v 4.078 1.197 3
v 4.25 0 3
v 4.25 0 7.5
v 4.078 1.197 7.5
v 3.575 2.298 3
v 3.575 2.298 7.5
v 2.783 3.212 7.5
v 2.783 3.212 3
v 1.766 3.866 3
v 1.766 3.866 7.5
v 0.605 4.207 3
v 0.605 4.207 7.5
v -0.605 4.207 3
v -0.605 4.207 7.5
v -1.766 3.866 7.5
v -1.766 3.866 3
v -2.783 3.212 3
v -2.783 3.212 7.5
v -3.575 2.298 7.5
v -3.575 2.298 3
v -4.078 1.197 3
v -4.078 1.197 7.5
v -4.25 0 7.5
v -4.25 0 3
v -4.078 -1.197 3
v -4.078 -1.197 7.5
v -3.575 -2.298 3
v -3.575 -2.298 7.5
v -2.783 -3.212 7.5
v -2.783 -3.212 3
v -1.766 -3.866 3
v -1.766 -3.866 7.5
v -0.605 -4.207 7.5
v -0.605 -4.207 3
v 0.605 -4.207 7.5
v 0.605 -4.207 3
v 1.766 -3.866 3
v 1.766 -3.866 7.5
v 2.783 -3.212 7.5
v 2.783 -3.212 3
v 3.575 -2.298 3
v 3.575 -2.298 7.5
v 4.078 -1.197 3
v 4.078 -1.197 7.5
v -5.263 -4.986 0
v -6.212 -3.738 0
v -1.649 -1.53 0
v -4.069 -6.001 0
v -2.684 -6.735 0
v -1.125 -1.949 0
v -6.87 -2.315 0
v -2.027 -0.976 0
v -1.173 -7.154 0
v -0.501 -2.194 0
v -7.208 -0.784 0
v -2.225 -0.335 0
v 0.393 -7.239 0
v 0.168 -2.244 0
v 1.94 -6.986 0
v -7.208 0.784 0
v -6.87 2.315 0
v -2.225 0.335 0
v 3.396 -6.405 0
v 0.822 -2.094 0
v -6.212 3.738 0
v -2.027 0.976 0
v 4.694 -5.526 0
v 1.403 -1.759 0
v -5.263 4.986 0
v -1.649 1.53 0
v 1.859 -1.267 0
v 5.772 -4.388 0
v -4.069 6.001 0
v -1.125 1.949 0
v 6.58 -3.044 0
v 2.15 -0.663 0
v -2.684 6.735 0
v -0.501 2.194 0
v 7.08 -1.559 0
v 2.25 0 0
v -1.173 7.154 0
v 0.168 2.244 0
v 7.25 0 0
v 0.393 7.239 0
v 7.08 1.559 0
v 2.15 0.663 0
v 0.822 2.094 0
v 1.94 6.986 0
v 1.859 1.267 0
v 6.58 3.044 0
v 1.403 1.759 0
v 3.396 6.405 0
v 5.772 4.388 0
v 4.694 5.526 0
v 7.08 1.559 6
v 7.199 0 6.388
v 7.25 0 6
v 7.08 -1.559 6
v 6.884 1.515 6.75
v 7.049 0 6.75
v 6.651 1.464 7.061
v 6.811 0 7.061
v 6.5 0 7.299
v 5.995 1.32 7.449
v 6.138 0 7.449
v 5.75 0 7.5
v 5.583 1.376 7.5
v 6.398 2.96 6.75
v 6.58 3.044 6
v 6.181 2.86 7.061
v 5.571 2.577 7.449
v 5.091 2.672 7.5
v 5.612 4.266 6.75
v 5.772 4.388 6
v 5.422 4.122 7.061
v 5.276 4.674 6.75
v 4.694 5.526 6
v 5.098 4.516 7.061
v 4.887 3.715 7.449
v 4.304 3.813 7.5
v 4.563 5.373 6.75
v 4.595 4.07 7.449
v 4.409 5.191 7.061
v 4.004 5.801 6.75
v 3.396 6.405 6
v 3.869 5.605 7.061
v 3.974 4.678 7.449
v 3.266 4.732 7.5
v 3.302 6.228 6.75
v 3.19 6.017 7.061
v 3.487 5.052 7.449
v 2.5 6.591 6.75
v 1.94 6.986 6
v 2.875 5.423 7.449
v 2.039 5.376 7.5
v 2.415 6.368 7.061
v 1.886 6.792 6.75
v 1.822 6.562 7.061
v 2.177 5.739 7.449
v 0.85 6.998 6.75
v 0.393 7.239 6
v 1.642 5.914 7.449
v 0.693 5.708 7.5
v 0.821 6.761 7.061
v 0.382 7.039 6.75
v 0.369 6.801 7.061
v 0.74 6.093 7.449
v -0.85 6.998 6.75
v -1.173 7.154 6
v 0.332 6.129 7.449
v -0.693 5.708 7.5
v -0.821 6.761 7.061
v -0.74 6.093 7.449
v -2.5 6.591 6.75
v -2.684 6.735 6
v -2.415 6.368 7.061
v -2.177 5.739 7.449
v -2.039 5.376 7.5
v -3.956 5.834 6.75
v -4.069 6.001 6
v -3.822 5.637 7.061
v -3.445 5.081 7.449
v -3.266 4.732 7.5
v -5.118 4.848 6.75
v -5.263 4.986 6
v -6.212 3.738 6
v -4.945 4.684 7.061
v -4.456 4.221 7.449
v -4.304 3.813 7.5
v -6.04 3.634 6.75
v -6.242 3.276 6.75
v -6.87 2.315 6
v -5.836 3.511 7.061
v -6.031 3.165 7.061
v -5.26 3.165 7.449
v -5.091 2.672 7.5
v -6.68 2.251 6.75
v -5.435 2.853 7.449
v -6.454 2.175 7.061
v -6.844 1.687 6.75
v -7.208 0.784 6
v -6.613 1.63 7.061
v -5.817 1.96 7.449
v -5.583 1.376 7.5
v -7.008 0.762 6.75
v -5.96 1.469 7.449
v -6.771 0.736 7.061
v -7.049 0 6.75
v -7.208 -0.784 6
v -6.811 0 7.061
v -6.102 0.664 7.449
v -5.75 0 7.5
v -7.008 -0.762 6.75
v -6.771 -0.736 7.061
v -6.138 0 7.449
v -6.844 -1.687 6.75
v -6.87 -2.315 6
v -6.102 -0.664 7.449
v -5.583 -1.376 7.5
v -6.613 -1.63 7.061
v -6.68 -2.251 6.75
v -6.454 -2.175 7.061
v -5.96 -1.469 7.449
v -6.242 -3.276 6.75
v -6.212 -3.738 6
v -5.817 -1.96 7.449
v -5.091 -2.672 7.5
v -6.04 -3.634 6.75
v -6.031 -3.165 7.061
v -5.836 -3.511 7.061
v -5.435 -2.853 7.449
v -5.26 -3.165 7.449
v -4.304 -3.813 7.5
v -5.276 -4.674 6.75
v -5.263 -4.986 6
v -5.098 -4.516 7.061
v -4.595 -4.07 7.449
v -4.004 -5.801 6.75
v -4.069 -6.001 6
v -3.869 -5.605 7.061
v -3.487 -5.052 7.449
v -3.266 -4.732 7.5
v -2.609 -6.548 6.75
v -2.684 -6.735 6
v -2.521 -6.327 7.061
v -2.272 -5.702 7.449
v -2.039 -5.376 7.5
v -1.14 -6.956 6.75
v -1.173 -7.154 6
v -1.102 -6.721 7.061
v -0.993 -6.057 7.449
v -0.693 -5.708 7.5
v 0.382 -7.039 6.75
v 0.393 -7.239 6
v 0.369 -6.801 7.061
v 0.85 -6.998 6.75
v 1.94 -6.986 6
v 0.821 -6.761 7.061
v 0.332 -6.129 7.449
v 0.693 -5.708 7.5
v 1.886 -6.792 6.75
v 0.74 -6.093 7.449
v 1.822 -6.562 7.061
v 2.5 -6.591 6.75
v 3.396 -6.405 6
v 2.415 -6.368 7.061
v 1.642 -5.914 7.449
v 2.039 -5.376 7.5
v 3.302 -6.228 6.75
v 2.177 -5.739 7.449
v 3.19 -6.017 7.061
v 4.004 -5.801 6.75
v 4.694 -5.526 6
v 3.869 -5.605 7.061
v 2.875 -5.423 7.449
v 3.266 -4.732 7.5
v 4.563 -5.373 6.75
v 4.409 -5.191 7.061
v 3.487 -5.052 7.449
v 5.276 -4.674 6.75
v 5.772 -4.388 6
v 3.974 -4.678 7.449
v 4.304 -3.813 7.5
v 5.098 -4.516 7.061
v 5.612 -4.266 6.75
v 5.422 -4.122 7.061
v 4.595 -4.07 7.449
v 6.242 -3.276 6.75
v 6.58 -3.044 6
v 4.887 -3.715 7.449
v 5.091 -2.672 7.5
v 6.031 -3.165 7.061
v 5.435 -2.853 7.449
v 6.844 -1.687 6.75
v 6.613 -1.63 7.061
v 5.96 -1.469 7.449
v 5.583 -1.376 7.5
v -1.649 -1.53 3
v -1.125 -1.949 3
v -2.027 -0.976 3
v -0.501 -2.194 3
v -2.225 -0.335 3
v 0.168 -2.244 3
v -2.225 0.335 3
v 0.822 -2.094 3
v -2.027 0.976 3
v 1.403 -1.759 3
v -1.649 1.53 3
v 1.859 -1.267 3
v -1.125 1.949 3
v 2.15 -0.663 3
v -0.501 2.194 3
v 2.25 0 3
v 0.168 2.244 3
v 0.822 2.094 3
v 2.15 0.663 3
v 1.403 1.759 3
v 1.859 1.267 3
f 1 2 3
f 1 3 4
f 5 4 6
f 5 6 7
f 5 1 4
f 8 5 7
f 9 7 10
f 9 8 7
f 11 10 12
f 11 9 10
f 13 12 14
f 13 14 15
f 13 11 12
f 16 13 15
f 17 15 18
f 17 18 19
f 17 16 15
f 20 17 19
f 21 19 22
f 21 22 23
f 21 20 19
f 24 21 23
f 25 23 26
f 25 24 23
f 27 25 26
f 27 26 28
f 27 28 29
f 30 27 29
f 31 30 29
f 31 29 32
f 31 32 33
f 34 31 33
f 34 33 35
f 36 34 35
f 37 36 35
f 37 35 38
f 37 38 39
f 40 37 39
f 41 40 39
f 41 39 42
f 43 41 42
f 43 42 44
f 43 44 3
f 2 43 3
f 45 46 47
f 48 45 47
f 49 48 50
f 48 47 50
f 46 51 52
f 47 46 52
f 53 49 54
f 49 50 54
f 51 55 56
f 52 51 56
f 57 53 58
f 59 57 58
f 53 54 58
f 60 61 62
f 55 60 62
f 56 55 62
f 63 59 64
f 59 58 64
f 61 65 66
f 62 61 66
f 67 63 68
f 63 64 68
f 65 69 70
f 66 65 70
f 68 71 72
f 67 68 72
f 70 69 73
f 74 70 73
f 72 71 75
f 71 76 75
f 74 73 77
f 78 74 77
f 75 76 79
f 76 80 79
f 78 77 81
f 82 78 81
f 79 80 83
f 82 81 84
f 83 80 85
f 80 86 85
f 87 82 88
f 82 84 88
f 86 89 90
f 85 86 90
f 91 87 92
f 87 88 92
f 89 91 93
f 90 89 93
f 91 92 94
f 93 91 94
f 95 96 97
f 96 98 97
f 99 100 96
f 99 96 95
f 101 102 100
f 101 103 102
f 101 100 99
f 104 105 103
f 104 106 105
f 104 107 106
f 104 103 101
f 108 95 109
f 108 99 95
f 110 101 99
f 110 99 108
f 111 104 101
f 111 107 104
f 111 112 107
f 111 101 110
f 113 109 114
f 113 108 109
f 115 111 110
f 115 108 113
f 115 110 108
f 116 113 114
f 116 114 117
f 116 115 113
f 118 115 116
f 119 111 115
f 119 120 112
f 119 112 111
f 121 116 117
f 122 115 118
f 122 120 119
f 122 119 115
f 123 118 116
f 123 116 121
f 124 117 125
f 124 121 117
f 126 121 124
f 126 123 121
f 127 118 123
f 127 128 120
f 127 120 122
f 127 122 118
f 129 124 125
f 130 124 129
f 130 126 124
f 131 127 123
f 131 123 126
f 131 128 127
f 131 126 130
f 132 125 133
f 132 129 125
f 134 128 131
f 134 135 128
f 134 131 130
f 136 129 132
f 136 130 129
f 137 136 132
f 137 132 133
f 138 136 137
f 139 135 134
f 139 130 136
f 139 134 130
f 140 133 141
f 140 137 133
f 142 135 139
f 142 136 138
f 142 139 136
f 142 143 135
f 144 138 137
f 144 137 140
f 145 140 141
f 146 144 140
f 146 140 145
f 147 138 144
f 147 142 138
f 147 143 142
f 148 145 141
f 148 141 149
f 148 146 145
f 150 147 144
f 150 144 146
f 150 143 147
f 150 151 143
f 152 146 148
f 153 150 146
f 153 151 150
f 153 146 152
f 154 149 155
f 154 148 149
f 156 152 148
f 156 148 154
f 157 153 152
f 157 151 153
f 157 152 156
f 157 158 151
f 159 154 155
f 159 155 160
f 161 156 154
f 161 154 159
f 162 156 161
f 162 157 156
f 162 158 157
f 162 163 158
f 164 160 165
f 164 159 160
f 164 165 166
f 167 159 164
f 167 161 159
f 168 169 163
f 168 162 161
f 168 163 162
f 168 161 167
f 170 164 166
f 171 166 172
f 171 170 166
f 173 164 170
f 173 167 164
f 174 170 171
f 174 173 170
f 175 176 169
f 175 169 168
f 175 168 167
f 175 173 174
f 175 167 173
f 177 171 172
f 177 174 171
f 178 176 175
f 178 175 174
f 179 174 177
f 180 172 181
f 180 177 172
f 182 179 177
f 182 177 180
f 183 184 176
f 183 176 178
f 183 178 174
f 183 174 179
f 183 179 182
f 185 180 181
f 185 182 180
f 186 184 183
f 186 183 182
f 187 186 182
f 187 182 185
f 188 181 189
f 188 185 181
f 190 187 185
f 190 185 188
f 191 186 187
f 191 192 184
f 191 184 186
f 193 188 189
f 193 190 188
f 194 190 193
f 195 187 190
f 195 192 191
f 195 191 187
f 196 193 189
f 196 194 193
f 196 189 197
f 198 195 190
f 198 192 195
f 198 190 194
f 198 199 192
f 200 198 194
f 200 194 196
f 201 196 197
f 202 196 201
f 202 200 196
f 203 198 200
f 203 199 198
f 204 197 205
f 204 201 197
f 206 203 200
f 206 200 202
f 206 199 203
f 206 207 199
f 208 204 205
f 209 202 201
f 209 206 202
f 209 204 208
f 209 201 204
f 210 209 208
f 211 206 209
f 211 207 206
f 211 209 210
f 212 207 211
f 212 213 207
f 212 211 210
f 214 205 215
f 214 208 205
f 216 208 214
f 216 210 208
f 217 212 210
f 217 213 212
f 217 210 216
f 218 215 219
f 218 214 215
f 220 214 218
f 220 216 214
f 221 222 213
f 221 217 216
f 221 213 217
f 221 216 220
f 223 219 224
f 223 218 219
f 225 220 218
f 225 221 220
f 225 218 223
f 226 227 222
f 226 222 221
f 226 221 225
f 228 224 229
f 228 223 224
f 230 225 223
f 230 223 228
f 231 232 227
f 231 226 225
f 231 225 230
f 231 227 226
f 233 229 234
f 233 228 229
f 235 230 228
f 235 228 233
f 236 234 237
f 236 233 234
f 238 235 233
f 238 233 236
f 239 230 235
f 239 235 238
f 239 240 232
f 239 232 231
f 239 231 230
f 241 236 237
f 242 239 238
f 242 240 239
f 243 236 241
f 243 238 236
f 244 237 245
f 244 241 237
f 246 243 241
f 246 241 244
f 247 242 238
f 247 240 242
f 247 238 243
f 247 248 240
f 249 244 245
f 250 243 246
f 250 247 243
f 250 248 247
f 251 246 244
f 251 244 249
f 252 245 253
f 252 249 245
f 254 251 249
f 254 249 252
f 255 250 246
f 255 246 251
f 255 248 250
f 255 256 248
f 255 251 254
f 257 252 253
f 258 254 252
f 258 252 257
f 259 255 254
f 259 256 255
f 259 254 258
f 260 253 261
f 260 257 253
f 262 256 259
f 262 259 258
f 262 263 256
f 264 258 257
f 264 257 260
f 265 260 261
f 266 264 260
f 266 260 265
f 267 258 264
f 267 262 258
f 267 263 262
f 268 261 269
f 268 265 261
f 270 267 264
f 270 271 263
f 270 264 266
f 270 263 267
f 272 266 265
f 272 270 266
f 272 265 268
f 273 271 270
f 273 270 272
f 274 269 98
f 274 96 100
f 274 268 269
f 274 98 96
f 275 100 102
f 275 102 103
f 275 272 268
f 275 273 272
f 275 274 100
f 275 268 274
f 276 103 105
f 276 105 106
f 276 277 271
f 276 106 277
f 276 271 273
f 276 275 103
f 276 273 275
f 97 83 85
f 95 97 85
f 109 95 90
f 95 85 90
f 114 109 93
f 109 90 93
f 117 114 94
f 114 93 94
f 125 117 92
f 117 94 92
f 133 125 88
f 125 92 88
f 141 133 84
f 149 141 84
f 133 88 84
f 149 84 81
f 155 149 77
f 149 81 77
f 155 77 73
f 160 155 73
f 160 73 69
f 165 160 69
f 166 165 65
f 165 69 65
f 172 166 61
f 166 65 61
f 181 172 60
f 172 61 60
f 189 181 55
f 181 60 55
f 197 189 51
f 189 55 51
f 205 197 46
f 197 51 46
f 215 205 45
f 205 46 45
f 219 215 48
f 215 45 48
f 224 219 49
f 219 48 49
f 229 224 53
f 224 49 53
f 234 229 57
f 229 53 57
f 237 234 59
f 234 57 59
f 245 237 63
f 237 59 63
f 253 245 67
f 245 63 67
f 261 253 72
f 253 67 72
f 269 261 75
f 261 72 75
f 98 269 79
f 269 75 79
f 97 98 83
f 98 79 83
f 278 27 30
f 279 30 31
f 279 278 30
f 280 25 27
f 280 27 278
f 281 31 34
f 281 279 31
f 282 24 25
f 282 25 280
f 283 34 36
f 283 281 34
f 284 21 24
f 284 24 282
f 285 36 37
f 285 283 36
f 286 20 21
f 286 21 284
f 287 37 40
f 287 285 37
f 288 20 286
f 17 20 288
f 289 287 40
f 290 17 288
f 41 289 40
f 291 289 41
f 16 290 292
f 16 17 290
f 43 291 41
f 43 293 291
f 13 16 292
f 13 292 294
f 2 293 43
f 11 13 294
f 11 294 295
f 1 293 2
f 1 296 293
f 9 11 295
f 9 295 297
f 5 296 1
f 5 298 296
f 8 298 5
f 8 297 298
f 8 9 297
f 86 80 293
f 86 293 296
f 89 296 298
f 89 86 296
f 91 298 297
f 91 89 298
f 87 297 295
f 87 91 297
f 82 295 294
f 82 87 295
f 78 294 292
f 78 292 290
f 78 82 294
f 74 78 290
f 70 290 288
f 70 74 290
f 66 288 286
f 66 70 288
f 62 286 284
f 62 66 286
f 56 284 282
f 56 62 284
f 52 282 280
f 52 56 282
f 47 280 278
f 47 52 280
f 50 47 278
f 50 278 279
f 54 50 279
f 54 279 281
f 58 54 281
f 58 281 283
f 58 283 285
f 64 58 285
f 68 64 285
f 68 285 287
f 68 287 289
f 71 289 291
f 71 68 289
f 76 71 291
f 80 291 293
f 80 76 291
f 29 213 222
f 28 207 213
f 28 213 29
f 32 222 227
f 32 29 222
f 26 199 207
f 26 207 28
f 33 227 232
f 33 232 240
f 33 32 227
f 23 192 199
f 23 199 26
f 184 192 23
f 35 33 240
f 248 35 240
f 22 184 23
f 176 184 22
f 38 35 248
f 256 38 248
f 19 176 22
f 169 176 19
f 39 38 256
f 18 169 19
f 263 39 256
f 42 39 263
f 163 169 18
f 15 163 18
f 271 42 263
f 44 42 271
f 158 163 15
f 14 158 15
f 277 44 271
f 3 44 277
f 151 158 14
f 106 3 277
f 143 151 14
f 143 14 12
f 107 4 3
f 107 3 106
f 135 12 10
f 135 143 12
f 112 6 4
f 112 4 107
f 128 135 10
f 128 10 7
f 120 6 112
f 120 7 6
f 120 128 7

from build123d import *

# Parameters (mm, degrees)
F4_R     = 7.25
F4_R_2   = 4.25
F5_DEPTH = 7.5
F4_R_3   = 2.25
F6_DEPTH = 3
F7_R     = 1.5


# Not quite as in the source:
# - a feature of the source that left no trace in its solid (it failed there, or was rolled back) is left out


with BuildPart() as f5:
    # F4 (on Top) → F5 (new body)
    with BuildSketch(Plane.XY):
        Circle(F4_R)
        Circle(F4_R_2, mode=Mode.SUBTRACT)
    extrude(amount=F5_DEPTH)

    # F4 (on Top) → F6 (join)
    with BuildSketch(Plane.XY):
        Circle(F4_R_2)
        Circle(F4_R_3, mode=Mode.SUBTRACT)
    extrude(amount=F6_DEPTH)

    # F7
    f7_edges = [f5.edges().sort_by_distance(p)[0] for p in [
        (-7.25, 0, 7.5),
    ]]
    fillet(f7_edges, radius=F7_R)


solid = f5.part
